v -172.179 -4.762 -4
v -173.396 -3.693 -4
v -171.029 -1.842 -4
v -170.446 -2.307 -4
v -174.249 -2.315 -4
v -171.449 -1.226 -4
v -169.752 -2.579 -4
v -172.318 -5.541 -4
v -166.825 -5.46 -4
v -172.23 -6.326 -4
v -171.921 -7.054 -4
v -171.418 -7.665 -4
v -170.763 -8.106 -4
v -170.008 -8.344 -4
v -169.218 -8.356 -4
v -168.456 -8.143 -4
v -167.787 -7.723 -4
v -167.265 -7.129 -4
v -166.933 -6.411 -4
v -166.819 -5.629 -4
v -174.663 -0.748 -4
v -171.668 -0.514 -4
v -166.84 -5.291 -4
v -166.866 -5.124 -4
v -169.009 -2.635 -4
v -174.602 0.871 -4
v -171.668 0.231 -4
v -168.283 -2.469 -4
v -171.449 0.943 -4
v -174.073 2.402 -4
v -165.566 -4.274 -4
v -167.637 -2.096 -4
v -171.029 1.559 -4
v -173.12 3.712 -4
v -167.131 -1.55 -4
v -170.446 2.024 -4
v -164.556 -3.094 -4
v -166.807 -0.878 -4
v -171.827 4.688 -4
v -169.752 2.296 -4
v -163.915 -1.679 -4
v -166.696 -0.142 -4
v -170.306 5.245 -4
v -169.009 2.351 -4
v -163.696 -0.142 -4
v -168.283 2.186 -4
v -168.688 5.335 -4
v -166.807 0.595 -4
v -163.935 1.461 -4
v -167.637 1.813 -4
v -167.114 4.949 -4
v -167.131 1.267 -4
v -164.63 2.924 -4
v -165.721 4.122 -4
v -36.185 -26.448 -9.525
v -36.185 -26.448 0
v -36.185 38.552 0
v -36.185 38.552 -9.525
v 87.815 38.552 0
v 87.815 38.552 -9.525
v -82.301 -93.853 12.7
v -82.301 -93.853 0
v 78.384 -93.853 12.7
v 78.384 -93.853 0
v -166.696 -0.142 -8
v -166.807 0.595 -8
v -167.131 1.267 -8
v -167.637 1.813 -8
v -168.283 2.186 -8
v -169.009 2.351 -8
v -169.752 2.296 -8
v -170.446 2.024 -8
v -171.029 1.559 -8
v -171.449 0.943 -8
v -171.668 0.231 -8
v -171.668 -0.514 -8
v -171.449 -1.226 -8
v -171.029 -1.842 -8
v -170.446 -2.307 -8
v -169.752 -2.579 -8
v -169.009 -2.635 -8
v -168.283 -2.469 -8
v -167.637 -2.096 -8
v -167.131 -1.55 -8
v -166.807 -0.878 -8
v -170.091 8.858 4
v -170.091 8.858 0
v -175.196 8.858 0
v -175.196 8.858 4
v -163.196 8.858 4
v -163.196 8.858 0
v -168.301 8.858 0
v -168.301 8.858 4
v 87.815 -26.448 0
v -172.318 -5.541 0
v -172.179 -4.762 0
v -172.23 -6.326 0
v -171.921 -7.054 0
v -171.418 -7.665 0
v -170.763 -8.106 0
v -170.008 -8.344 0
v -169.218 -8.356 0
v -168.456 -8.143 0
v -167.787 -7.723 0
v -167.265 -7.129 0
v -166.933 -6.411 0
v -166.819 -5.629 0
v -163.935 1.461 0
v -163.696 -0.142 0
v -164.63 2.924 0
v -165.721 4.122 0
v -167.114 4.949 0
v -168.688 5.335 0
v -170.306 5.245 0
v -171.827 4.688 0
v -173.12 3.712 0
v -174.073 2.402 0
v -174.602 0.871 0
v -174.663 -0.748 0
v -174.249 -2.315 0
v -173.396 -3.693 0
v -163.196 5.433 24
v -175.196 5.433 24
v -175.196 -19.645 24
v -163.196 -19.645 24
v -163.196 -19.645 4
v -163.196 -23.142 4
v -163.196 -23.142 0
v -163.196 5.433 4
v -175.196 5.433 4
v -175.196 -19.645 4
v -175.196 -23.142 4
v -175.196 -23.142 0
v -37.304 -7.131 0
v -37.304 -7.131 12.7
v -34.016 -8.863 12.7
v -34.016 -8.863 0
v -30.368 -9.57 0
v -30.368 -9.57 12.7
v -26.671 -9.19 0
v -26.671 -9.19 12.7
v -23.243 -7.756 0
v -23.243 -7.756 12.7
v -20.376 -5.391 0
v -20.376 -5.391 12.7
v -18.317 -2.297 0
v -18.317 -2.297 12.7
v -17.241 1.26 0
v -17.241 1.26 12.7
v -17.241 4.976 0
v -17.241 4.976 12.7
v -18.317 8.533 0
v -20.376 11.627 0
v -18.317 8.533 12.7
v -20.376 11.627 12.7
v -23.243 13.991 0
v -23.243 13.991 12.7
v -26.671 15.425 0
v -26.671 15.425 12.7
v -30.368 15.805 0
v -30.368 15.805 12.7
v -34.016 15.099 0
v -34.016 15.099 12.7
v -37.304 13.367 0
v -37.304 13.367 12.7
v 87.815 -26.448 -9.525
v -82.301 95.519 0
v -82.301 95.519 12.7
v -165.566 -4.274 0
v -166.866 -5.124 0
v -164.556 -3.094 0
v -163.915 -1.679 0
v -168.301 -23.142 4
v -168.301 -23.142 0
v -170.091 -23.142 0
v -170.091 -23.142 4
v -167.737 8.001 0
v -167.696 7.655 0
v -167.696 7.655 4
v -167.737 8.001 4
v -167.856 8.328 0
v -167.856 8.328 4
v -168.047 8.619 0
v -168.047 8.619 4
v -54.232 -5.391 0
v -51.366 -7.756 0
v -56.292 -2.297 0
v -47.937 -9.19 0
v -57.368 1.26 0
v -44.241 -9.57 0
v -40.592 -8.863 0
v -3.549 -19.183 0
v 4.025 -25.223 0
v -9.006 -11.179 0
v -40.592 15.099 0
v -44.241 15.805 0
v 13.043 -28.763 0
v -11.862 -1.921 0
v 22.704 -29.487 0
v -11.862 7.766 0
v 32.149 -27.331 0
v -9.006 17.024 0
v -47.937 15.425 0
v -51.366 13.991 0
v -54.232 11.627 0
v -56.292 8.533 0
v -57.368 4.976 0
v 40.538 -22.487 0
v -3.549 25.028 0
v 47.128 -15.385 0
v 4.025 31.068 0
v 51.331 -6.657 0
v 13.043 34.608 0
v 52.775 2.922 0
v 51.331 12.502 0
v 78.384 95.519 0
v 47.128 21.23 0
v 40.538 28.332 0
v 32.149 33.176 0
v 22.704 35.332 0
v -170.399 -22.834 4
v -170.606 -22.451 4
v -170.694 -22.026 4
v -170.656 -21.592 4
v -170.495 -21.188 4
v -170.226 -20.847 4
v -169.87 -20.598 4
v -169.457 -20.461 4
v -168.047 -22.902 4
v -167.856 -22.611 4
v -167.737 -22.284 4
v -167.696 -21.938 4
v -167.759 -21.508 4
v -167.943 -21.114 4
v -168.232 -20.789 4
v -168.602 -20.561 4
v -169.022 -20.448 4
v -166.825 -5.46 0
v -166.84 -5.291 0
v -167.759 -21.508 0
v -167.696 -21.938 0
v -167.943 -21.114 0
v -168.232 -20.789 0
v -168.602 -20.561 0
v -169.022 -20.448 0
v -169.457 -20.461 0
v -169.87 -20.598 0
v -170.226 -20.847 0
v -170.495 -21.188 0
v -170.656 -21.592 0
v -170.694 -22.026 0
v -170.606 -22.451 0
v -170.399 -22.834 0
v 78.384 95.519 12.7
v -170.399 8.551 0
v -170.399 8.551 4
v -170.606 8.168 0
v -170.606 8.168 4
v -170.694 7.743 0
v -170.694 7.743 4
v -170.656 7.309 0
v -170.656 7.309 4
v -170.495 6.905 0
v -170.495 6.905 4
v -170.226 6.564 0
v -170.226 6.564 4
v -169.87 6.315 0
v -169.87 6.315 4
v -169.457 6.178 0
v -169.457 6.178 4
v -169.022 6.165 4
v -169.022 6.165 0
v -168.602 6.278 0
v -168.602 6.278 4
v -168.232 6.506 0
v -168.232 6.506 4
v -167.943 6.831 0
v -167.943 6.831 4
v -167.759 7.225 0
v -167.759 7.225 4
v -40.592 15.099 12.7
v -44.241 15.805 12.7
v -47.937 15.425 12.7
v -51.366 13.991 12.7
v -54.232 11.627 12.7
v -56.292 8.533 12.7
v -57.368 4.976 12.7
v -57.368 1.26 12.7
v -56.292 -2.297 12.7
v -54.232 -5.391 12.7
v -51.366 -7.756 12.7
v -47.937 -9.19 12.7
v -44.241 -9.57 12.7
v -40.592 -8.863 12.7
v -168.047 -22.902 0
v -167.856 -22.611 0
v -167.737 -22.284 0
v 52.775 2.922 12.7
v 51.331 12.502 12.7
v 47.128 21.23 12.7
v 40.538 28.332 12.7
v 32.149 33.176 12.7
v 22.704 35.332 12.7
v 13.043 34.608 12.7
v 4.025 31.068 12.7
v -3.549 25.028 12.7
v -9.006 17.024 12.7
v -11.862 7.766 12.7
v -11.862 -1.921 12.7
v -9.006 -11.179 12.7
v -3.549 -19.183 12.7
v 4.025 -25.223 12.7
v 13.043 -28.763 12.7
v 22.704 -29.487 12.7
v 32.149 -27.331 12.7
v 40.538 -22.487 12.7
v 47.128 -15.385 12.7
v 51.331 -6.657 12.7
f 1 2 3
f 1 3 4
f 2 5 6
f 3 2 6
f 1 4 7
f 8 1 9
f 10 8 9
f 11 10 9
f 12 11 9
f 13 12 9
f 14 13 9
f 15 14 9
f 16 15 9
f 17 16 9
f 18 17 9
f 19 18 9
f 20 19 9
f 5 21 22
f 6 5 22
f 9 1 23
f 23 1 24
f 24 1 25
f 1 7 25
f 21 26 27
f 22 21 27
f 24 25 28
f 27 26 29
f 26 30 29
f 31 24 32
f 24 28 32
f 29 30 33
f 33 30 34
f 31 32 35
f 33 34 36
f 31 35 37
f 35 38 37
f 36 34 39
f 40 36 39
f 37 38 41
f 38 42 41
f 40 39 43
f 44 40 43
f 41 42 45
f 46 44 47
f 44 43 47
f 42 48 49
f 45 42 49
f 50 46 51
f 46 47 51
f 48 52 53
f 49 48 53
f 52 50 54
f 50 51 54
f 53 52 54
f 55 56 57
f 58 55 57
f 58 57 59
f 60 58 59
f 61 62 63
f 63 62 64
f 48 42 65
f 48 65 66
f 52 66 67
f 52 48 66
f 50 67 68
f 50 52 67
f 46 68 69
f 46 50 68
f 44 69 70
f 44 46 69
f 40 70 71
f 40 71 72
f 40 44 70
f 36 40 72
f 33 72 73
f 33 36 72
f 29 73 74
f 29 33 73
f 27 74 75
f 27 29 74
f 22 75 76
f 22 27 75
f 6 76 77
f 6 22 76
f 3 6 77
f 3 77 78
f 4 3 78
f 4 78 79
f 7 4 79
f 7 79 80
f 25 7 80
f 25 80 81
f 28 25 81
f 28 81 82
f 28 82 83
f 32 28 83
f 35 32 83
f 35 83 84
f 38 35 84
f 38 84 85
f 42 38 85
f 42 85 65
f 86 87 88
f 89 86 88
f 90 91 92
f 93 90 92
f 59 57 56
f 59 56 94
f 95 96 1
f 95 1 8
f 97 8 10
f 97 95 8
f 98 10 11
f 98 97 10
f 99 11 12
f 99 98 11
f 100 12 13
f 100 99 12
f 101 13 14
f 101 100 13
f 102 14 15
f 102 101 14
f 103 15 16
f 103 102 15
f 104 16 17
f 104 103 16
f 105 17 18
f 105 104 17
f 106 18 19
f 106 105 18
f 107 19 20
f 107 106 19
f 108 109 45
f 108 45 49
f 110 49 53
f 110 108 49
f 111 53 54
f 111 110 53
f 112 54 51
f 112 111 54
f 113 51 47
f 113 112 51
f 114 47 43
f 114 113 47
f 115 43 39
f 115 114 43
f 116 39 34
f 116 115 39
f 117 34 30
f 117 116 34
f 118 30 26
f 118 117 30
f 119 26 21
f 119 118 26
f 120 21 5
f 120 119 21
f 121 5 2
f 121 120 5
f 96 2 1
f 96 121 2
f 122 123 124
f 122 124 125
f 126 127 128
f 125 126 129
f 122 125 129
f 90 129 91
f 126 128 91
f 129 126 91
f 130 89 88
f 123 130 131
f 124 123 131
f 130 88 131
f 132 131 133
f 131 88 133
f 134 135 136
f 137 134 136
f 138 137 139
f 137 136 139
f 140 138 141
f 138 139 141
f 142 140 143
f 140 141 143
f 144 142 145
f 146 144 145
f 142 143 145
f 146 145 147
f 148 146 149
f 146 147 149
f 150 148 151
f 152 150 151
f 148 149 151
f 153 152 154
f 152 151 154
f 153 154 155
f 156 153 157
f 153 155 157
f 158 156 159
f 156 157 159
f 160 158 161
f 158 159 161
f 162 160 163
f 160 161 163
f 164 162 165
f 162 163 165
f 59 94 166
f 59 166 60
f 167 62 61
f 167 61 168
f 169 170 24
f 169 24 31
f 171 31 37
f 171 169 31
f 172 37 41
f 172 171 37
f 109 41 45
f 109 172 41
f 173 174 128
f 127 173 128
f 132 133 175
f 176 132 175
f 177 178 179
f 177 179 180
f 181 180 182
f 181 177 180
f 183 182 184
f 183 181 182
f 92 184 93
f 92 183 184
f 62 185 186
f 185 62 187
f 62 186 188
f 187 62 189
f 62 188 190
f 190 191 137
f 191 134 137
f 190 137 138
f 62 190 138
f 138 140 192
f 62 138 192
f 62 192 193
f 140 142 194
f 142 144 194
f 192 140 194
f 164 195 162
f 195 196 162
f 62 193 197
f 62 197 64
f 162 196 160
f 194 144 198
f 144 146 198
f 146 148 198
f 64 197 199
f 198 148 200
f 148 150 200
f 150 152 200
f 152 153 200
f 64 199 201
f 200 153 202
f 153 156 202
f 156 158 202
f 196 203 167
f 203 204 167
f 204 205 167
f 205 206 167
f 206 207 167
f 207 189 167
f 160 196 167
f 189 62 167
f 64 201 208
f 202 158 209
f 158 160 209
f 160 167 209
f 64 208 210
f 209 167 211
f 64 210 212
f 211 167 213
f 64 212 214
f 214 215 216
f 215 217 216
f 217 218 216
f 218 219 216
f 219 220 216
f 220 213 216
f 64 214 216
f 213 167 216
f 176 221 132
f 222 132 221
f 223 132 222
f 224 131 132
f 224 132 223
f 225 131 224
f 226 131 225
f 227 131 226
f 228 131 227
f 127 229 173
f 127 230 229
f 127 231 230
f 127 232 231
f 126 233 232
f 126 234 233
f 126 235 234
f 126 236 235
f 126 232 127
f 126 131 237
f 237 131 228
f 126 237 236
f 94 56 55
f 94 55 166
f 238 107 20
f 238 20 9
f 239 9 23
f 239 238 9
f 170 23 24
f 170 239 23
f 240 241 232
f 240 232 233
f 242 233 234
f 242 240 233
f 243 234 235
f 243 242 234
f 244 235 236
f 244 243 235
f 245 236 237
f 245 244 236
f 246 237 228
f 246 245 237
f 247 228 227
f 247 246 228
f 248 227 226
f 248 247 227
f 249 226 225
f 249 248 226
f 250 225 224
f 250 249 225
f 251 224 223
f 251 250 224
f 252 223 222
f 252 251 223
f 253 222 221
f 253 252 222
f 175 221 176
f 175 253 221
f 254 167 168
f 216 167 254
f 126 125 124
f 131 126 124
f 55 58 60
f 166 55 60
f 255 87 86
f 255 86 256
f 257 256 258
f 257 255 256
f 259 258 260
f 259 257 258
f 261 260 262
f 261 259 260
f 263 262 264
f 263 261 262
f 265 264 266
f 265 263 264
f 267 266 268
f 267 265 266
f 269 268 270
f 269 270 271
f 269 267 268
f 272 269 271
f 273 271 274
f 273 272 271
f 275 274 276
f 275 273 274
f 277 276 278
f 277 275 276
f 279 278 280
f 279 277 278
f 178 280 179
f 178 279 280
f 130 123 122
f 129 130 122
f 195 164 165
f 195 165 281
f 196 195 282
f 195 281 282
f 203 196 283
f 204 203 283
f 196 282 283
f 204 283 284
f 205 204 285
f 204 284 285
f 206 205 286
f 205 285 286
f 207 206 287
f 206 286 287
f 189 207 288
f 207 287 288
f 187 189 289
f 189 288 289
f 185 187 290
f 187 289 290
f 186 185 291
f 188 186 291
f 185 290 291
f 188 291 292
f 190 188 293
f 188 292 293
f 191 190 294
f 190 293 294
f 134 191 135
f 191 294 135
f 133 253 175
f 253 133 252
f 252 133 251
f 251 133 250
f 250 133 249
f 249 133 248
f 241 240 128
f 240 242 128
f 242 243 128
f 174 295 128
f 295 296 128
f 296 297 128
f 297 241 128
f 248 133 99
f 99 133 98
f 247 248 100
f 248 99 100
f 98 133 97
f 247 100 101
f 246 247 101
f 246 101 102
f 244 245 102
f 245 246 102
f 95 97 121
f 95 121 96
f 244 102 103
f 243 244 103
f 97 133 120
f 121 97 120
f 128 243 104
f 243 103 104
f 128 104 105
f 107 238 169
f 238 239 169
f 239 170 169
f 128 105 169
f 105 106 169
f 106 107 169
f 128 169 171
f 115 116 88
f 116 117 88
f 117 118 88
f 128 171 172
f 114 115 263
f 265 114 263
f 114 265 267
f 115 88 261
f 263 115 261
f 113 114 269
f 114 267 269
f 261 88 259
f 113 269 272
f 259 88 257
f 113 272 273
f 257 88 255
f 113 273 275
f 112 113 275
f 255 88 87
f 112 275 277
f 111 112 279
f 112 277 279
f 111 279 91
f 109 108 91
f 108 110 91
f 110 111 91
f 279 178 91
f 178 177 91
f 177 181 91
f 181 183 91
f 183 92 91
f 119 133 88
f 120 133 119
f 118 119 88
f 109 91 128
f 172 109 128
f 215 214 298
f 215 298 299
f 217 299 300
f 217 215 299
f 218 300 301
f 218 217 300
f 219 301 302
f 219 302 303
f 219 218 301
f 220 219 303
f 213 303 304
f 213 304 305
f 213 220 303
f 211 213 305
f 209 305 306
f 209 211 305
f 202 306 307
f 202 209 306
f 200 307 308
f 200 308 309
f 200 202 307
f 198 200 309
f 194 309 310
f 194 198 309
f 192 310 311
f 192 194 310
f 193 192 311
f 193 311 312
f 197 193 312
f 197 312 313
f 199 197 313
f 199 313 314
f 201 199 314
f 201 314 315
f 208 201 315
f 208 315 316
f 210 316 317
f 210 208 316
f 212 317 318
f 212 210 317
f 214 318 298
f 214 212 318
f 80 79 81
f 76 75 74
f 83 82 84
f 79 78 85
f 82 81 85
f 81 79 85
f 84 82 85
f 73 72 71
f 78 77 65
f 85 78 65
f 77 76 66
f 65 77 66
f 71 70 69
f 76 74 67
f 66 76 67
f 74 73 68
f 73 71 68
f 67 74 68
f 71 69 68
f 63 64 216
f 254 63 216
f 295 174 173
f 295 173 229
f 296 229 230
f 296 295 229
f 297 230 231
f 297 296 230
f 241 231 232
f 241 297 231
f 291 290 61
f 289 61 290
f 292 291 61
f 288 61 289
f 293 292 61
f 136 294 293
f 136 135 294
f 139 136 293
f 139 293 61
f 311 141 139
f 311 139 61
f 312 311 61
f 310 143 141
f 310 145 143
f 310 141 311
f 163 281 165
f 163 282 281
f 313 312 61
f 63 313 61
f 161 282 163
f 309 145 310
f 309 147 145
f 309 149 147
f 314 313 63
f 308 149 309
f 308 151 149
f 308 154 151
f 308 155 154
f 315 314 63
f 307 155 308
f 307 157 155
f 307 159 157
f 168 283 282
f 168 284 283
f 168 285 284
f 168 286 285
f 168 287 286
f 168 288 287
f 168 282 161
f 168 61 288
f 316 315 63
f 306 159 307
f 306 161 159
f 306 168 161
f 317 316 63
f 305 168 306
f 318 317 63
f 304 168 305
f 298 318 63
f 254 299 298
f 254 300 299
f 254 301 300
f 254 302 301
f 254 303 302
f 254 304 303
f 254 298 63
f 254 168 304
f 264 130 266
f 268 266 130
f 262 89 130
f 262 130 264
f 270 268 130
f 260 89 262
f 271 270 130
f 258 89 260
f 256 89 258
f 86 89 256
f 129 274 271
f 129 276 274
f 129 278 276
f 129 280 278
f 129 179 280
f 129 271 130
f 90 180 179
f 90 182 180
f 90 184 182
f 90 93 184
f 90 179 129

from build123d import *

# Parameters (mm, degrees)
F0_W      = 160.6854679329
F0_H      = 189.3717367202
F0_R      = 32.5
F1_DEPTH  = 12.7
F2_W      = 124
F2_H      = 65
F3_DEPTH  = 9.525
F5_DEPTH  = 12.7
F6_R      = 2.5
F7_DEPTH  = 24
F8_DEPTH  = 4
F9_DEPTH  = 8
F11_DEPTH = 20
F12_DEPTH = 4


# Not quite as in the source:
# - a length typed as a fraction of an inch, garbled in the dataset ("3 / 203.2 mm" for 3/8 in), is restored


with BuildPart() as f1:
    # F0 (on Top) → F1 (new body)
    with BuildSketch(Plane.XY):
        with Locations((-1.9587278366, 0.8332561702)):
            Rectangle(F0_W, F0_H)
        with Locations((20.2750398644, 2.9224749887)):
            Circle(F0_R, mode=Mode.SUBTRACT)
    extrude(amount=F1_DEPTH)

    # F4 (on face) → F5 (cut, through all)
    with BuildSketch(Plane.XY.offset(12.7)):
        with BuildLine():
            ThreePointArc((-37.3042601347, -7.1310623929), (-24.0579569753, -8.2077946527), (-17.1042601347, 3.1178399874))
            ThreePointArc((-17.1042601347, 3.1178399874), (-24.0579569753, 14.4434746274), (-37.3042601347, 13.3667423676))
            ThreePointArc((-37.3042601347, 13.3667423676), (-33.4786254946, 8.8641431468), (-32.1042601347, 3.1178399874))
            ThreePointArc((-32.1042601347, 3.1178399874), (-33.4786254946, -2.628463172), (-37.3042601347, -7.1310623929))
        make_face()
        with BuildLine():
            ThreePointArc((-32.1042601347, 3.1178399874), (-33.4786254946, 8.8641431468), (-37.3042601347, 13.3667423676))
            ThreePointArc((-37.3042601347, 13.3667423676), (-42.5042601347, 3.1178399874), (-37.3042601347, -7.1310623929))
            ThreePointArc((-37.3042601347, -7.1310623929), (-33.4786254946, -2.628463172), (-32.1042601347, 3.1178399874))
        make_face()
        with BuildLine():
            ThreePointArc((-37.3042601347, -7.1310623929), (-42.5042601347, 3.1178399874), (-37.3042601347, 13.3667423676))
            ThreePointArc((-37.3042601347, 13.3667423676), (-57.5042601347, 3.1178399874), (-37.3042601347, -7.1310623929))
        make_face()
    extrude(amount=-F5_DEPTH, mode=Mode.SUBTRACT)


with BuildPart() as f3:
    # F2 (on Top) → F3 (new body)
    with BuildSketch(Plane.XY):
        with Locations((25.8148865969, 6.0524680488)):
            Rectangle(F2_W, F2_H)
    extrude(amount=-F3_DEPTH)


with BuildPart() as f7:
    # F6 (on Top) → F7 (new body)
    with BuildSketch(Plane.XY):
        with BuildLine():
            Line((-170.091433923, 8.8584844804), (-175.1961884499, 8.8584844804))
            Line((-175.1961884499, 8.8584844804), (-175.1961884499, -23.1415155196))
            Line((-175.1961884499, -23.1415155196), (-170.091433923, -23.1415155196))
            ThreePointArc((-170.091433923, -23.1415155196), (-169.8696614598, -20.5976531011), (-167.6961884499, -21.9379642981))
            ThreePointArc((-167.6961884499, -21.9379642981), (-167.8558772528, -22.611437308), (-168.3009429767, -23.1415155196))
            Line((-168.3009429767, -23.1415155196), (-163.1961884499, -23.1415155196))
            Line((-163.1961884499, -23.1415155196), (-163.1961884499, 8.8584844804))
            Line((-163.1961884499, 8.8584844804), (-168.3009429767, 8.8584844804))
            ThreePointArc((-168.3009429767, 8.8584844804), (-167.8558772528, 8.3284062688), (-167.6961884499, 7.6549332589))
            ThreePointArc((-167.6961884499, 7.6549332589), (-169.8696614598, 6.3146220619), (-170.091433923, 8.8584844804))
        make_face()
        with BuildLine():
            ThreePointArc((-172.1793124567, -4.7622266293), (-171.827045531, 4.6884524947), (-163.6961884499, -0.1415155196))
            ThreePointArc((-163.6961884499, -0.1415155196), (-164.5558902937, -3.0940793244), (-166.8662368213, -5.1236160213))
            ThreePointArc((-166.8662368213, -5.1236160213), (-166.8311565651, -5.3751444183), (-166.8194298089, -5.6288364404))
            ThreePointArc((-166.8194298089, -5.6288364404), (-170.0083618757, -8.3435811136), (-172.1793124567, -4.7622266293))
        make_face(mode=Mode.SUBTRACT)
        with BuildLine():
            ThreePointArc((-168.3009429767, 8.8584844804), (-169.1961884499, 9.1549332589), (-170.091433923, 8.8584844804))
            Line((-170.091433923, 8.8584844804), (-168.3009429767, 8.8584844804))
        make_face()
        with BuildLine():
            Line((-168.3009429767, 8.8584844804), (-170.091433923, 8.8584844804))
            ThreePointArc((-170.091433923, 8.8584844804), (-169.8696614598, 6.3146220619), (-167.6961884499, 7.6549332589))
            ThreePointArc((-167.6961884499, 7.6549332589), (-167.8558772528, 8.3284062688), (-168.3009429767, 8.8584844804))
        make_face()
        with BuildLine():
            ThreePointArc((-167.6961884499, -21.9379642981), (-169.8696614598, -20.5976531011), (-170.091433923, -23.1415155196))
            Line((-170.091433923, -23.1415155196), (-168.3009429767, -23.1415155196))
            ThreePointArc((-168.3009429767, -23.1415155196), (-167.8558772528, -22.611437308), (-167.6961884499, -21.9379642981))
        make_face()
        with BuildLine():
            Line((-168.3009429767, -23.1415155196), (-170.091433923, -23.1415155196))
            ThreePointArc((-170.091433923, -23.1415155196), (-169.1961884499, -23.4379642981), (-168.3009429767, -23.1415155196))
        make_face()
        with BuildLine():
            ThreePointArc((-166.8662368213, -5.1236160213), (-164.5558902937, -3.0940793244), (-163.6961884499, -0.1415155196))
            ThreePointArc((-163.6961884499, -0.1415155196), (-171.827045531, 4.6884524947), (-172.1793124567, -4.7622266293))
            ThreePointArc((-172.1793124567, -4.7622266293), (-169.3828091294, -2.88517598), (-166.8662368213, -5.1236160213))
        make_face()
        with Locations((-169.1961884499, -0.1415155196)):
            Circle(F6_R, mode=Mode.SUBTRACT)
        with Locations((-169.1961884499, -0.1415155196)):
            Circle(F6_R)
        with BuildLine():
            ThreePointArc((-166.8662368213, -5.1236160213), (-169.5694298089, -5.6288364404), (-172.1793124567, -4.7622266293))
            ThreePointArc((-172.1793124567, -4.7622266293), (-170.0083618757, -8.3435811136), (-166.8194298089, -5.6288364404))
            ThreePointArc((-166.8194298089, -5.6288364404), (-166.8311565651, -5.3751444183), (-166.8662368213, -5.1236160213))
        make_face()
        with BuildLine():
            ThreePointArc((-166.8662368213, -5.1236160213), (-169.3828091294, -2.88517598), (-172.1793124567, -4.7622266293))
            ThreePointArc((-172.1793124567, -4.7622266293), (-169.5694298089, -5.6288364404), (-166.8662368213, -5.1236160213))
        make_face()
    extrude(amount=F7_DEPTH)

    # F6 (on Top) → F8 (join)
    with BuildSketch(Plane.XY):
        with BuildLine():
            ThreePointArc((-166.8662368213, -5.1236160213), (-164.5558902937, -3.0940793244), (-163.6961884499, -0.1415155196))
            ThreePointArc((-163.6961884499, -0.1415155196), (-171.827045531, 4.6884524947), (-172.1793124567, -4.7622266293))
            ThreePointArc((-172.1793124567, -4.7622266293), (-169.3828091294, -2.88517598), (-166.8662368213, -5.1236160213))
        make_face()
        with Locations((-169.1961884499, -0.1415155196)):
            Circle(F6_R, mode=Mode.SUBTRACT)
        with BuildLine():
            ThreePointArc((-166.8662368213, -5.1236160213), (-169.5694298089, -5.6288364404), (-172.1793124567, -4.7622266293))
            ThreePointArc((-172.1793124567, -4.7622266293), (-170.0083618757, -8.3435811136), (-166.8194298089, -5.6288364404))
            ThreePointArc((-166.8194298089, -5.6288364404), (-166.8311565651, -5.3751444183), (-166.8662368213, -5.1236160213))
        make_face()
        with BuildLine():
            ThreePointArc((-166.8662368213, -5.1236160213), (-169.3828091294, -2.88517598), (-172.1793124567, -4.7622266293))
            ThreePointArc((-172.1793124567, -4.7622266293), (-169.5694298089, -5.6288364404), (-166.8662368213, -5.1236160213))
        make_face()
    extrude(amount=-F8_DEPTH)

    # F6 (on Top) → F9 (join)
    with BuildSketch(Plane.XY):
        with Locations((-169.1961884499, -0.1415155196)):
            Circle(F6_R)
    extrude(amount=-F9_DEPTH)

    # F10 (on face) → F11 (cut)
    with BuildSketch(Plane.XY.offset(24)):
        with BuildLine():
            Line((-175.1961884499, 5.4334374145), (-163.1961884499, 5.4334374145))
            Line((-163.1961884499, 5.4334374145), (-163.1961884499, 8.8584844804))
            Line((-163.1961884499, 8.8584844804), (-168.3009429767, 8.8584844804))
            ThreePointArc((-168.3009429767, 8.8584844804), (-169.1961884499, 9.1549332589), (-170.091433923, 8.8584844804))
            Line((-170.091433923, 8.8584844804), (-175.1961884499, 8.8584844804))
            Line((-175.1961884499, 8.8584844804), (-175.1961884499, 5.4334374145))
        make_face()
        with BuildLine():
            Line((-163.1961884499, -23.1415155196), (-163.1961884499, -19.6447968483))
            Line((-163.1961884499, -19.6447968483), (-175.1961884499, -19.6447968483))
            Line((-175.1961884499, -19.6447968483), (-175.1961884499, -23.1415155196))
            Line((-175.1961884499, -23.1415155196), (-170.091433923, -23.1415155196))
            ThreePointArc((-170.091433923, -23.1415155196), (-169.1961884499, -23.4379642981), (-168.3009429767, -23.1415155196))
            Line((-168.3009429767, -23.1415155196), (-163.1961884499, -23.1415155196))
        make_face()
    extrude(amount=-F11_DEPTH, mode=Mode.SUBTRACT)

    # F6 (on Top) → F12 (cut, through all)
    with BuildSketch(Plane.XY):
        with BuildLine():
            Line((-168.3009429767, 8.8584844804), (-170.091433923, 8.8584844804))
            ThreePointArc((-170.091433923, 8.8584844804), (-169.8696614598, 6.3146220619), (-167.6961884499, 7.6549332589))
            ThreePointArc((-167.6961884499, 7.6549332589), (-167.8558772528, 8.3284062688), (-168.3009429767, 8.8584844804))
        make_face()
        with BuildLine():
            ThreePointArc((-167.6961884499, -21.9379642981), (-169.8696614598, -20.5976531011), (-170.091433923, -23.1415155196))
            Line((-170.091433923, -23.1415155196), (-168.3009429767, -23.1415155196))
            ThreePointArc((-168.3009429767, -23.1415155196), (-167.8558772528, -22.611437308), (-167.6961884499, -21.9379642981))
        make_face()
        with BuildLine():
            Line((-168.3009429767, -23.1415155196), (-170.091433923, -23.1415155196))
            ThreePointArc((-170.091433923, -23.1415155196), (-169.1961884499, -23.4379642981), (-168.3009429767, -23.1415155196))
        make_face()
        with BuildLine():
            ThreePointArc((-168.3009429767, 8.8584844804), (-169.1961884499, 9.1549332589), (-170.091433923, 8.8584844804))
            Line((-170.091433923, 8.8584844804), (-168.3009429767, 8.8584844804))
        make_face()
    extrude(amount=F12_DEPTH, mode=Mode.SUBTRACT)


solid = Compound([f1.part, f3.part, f7.part])
